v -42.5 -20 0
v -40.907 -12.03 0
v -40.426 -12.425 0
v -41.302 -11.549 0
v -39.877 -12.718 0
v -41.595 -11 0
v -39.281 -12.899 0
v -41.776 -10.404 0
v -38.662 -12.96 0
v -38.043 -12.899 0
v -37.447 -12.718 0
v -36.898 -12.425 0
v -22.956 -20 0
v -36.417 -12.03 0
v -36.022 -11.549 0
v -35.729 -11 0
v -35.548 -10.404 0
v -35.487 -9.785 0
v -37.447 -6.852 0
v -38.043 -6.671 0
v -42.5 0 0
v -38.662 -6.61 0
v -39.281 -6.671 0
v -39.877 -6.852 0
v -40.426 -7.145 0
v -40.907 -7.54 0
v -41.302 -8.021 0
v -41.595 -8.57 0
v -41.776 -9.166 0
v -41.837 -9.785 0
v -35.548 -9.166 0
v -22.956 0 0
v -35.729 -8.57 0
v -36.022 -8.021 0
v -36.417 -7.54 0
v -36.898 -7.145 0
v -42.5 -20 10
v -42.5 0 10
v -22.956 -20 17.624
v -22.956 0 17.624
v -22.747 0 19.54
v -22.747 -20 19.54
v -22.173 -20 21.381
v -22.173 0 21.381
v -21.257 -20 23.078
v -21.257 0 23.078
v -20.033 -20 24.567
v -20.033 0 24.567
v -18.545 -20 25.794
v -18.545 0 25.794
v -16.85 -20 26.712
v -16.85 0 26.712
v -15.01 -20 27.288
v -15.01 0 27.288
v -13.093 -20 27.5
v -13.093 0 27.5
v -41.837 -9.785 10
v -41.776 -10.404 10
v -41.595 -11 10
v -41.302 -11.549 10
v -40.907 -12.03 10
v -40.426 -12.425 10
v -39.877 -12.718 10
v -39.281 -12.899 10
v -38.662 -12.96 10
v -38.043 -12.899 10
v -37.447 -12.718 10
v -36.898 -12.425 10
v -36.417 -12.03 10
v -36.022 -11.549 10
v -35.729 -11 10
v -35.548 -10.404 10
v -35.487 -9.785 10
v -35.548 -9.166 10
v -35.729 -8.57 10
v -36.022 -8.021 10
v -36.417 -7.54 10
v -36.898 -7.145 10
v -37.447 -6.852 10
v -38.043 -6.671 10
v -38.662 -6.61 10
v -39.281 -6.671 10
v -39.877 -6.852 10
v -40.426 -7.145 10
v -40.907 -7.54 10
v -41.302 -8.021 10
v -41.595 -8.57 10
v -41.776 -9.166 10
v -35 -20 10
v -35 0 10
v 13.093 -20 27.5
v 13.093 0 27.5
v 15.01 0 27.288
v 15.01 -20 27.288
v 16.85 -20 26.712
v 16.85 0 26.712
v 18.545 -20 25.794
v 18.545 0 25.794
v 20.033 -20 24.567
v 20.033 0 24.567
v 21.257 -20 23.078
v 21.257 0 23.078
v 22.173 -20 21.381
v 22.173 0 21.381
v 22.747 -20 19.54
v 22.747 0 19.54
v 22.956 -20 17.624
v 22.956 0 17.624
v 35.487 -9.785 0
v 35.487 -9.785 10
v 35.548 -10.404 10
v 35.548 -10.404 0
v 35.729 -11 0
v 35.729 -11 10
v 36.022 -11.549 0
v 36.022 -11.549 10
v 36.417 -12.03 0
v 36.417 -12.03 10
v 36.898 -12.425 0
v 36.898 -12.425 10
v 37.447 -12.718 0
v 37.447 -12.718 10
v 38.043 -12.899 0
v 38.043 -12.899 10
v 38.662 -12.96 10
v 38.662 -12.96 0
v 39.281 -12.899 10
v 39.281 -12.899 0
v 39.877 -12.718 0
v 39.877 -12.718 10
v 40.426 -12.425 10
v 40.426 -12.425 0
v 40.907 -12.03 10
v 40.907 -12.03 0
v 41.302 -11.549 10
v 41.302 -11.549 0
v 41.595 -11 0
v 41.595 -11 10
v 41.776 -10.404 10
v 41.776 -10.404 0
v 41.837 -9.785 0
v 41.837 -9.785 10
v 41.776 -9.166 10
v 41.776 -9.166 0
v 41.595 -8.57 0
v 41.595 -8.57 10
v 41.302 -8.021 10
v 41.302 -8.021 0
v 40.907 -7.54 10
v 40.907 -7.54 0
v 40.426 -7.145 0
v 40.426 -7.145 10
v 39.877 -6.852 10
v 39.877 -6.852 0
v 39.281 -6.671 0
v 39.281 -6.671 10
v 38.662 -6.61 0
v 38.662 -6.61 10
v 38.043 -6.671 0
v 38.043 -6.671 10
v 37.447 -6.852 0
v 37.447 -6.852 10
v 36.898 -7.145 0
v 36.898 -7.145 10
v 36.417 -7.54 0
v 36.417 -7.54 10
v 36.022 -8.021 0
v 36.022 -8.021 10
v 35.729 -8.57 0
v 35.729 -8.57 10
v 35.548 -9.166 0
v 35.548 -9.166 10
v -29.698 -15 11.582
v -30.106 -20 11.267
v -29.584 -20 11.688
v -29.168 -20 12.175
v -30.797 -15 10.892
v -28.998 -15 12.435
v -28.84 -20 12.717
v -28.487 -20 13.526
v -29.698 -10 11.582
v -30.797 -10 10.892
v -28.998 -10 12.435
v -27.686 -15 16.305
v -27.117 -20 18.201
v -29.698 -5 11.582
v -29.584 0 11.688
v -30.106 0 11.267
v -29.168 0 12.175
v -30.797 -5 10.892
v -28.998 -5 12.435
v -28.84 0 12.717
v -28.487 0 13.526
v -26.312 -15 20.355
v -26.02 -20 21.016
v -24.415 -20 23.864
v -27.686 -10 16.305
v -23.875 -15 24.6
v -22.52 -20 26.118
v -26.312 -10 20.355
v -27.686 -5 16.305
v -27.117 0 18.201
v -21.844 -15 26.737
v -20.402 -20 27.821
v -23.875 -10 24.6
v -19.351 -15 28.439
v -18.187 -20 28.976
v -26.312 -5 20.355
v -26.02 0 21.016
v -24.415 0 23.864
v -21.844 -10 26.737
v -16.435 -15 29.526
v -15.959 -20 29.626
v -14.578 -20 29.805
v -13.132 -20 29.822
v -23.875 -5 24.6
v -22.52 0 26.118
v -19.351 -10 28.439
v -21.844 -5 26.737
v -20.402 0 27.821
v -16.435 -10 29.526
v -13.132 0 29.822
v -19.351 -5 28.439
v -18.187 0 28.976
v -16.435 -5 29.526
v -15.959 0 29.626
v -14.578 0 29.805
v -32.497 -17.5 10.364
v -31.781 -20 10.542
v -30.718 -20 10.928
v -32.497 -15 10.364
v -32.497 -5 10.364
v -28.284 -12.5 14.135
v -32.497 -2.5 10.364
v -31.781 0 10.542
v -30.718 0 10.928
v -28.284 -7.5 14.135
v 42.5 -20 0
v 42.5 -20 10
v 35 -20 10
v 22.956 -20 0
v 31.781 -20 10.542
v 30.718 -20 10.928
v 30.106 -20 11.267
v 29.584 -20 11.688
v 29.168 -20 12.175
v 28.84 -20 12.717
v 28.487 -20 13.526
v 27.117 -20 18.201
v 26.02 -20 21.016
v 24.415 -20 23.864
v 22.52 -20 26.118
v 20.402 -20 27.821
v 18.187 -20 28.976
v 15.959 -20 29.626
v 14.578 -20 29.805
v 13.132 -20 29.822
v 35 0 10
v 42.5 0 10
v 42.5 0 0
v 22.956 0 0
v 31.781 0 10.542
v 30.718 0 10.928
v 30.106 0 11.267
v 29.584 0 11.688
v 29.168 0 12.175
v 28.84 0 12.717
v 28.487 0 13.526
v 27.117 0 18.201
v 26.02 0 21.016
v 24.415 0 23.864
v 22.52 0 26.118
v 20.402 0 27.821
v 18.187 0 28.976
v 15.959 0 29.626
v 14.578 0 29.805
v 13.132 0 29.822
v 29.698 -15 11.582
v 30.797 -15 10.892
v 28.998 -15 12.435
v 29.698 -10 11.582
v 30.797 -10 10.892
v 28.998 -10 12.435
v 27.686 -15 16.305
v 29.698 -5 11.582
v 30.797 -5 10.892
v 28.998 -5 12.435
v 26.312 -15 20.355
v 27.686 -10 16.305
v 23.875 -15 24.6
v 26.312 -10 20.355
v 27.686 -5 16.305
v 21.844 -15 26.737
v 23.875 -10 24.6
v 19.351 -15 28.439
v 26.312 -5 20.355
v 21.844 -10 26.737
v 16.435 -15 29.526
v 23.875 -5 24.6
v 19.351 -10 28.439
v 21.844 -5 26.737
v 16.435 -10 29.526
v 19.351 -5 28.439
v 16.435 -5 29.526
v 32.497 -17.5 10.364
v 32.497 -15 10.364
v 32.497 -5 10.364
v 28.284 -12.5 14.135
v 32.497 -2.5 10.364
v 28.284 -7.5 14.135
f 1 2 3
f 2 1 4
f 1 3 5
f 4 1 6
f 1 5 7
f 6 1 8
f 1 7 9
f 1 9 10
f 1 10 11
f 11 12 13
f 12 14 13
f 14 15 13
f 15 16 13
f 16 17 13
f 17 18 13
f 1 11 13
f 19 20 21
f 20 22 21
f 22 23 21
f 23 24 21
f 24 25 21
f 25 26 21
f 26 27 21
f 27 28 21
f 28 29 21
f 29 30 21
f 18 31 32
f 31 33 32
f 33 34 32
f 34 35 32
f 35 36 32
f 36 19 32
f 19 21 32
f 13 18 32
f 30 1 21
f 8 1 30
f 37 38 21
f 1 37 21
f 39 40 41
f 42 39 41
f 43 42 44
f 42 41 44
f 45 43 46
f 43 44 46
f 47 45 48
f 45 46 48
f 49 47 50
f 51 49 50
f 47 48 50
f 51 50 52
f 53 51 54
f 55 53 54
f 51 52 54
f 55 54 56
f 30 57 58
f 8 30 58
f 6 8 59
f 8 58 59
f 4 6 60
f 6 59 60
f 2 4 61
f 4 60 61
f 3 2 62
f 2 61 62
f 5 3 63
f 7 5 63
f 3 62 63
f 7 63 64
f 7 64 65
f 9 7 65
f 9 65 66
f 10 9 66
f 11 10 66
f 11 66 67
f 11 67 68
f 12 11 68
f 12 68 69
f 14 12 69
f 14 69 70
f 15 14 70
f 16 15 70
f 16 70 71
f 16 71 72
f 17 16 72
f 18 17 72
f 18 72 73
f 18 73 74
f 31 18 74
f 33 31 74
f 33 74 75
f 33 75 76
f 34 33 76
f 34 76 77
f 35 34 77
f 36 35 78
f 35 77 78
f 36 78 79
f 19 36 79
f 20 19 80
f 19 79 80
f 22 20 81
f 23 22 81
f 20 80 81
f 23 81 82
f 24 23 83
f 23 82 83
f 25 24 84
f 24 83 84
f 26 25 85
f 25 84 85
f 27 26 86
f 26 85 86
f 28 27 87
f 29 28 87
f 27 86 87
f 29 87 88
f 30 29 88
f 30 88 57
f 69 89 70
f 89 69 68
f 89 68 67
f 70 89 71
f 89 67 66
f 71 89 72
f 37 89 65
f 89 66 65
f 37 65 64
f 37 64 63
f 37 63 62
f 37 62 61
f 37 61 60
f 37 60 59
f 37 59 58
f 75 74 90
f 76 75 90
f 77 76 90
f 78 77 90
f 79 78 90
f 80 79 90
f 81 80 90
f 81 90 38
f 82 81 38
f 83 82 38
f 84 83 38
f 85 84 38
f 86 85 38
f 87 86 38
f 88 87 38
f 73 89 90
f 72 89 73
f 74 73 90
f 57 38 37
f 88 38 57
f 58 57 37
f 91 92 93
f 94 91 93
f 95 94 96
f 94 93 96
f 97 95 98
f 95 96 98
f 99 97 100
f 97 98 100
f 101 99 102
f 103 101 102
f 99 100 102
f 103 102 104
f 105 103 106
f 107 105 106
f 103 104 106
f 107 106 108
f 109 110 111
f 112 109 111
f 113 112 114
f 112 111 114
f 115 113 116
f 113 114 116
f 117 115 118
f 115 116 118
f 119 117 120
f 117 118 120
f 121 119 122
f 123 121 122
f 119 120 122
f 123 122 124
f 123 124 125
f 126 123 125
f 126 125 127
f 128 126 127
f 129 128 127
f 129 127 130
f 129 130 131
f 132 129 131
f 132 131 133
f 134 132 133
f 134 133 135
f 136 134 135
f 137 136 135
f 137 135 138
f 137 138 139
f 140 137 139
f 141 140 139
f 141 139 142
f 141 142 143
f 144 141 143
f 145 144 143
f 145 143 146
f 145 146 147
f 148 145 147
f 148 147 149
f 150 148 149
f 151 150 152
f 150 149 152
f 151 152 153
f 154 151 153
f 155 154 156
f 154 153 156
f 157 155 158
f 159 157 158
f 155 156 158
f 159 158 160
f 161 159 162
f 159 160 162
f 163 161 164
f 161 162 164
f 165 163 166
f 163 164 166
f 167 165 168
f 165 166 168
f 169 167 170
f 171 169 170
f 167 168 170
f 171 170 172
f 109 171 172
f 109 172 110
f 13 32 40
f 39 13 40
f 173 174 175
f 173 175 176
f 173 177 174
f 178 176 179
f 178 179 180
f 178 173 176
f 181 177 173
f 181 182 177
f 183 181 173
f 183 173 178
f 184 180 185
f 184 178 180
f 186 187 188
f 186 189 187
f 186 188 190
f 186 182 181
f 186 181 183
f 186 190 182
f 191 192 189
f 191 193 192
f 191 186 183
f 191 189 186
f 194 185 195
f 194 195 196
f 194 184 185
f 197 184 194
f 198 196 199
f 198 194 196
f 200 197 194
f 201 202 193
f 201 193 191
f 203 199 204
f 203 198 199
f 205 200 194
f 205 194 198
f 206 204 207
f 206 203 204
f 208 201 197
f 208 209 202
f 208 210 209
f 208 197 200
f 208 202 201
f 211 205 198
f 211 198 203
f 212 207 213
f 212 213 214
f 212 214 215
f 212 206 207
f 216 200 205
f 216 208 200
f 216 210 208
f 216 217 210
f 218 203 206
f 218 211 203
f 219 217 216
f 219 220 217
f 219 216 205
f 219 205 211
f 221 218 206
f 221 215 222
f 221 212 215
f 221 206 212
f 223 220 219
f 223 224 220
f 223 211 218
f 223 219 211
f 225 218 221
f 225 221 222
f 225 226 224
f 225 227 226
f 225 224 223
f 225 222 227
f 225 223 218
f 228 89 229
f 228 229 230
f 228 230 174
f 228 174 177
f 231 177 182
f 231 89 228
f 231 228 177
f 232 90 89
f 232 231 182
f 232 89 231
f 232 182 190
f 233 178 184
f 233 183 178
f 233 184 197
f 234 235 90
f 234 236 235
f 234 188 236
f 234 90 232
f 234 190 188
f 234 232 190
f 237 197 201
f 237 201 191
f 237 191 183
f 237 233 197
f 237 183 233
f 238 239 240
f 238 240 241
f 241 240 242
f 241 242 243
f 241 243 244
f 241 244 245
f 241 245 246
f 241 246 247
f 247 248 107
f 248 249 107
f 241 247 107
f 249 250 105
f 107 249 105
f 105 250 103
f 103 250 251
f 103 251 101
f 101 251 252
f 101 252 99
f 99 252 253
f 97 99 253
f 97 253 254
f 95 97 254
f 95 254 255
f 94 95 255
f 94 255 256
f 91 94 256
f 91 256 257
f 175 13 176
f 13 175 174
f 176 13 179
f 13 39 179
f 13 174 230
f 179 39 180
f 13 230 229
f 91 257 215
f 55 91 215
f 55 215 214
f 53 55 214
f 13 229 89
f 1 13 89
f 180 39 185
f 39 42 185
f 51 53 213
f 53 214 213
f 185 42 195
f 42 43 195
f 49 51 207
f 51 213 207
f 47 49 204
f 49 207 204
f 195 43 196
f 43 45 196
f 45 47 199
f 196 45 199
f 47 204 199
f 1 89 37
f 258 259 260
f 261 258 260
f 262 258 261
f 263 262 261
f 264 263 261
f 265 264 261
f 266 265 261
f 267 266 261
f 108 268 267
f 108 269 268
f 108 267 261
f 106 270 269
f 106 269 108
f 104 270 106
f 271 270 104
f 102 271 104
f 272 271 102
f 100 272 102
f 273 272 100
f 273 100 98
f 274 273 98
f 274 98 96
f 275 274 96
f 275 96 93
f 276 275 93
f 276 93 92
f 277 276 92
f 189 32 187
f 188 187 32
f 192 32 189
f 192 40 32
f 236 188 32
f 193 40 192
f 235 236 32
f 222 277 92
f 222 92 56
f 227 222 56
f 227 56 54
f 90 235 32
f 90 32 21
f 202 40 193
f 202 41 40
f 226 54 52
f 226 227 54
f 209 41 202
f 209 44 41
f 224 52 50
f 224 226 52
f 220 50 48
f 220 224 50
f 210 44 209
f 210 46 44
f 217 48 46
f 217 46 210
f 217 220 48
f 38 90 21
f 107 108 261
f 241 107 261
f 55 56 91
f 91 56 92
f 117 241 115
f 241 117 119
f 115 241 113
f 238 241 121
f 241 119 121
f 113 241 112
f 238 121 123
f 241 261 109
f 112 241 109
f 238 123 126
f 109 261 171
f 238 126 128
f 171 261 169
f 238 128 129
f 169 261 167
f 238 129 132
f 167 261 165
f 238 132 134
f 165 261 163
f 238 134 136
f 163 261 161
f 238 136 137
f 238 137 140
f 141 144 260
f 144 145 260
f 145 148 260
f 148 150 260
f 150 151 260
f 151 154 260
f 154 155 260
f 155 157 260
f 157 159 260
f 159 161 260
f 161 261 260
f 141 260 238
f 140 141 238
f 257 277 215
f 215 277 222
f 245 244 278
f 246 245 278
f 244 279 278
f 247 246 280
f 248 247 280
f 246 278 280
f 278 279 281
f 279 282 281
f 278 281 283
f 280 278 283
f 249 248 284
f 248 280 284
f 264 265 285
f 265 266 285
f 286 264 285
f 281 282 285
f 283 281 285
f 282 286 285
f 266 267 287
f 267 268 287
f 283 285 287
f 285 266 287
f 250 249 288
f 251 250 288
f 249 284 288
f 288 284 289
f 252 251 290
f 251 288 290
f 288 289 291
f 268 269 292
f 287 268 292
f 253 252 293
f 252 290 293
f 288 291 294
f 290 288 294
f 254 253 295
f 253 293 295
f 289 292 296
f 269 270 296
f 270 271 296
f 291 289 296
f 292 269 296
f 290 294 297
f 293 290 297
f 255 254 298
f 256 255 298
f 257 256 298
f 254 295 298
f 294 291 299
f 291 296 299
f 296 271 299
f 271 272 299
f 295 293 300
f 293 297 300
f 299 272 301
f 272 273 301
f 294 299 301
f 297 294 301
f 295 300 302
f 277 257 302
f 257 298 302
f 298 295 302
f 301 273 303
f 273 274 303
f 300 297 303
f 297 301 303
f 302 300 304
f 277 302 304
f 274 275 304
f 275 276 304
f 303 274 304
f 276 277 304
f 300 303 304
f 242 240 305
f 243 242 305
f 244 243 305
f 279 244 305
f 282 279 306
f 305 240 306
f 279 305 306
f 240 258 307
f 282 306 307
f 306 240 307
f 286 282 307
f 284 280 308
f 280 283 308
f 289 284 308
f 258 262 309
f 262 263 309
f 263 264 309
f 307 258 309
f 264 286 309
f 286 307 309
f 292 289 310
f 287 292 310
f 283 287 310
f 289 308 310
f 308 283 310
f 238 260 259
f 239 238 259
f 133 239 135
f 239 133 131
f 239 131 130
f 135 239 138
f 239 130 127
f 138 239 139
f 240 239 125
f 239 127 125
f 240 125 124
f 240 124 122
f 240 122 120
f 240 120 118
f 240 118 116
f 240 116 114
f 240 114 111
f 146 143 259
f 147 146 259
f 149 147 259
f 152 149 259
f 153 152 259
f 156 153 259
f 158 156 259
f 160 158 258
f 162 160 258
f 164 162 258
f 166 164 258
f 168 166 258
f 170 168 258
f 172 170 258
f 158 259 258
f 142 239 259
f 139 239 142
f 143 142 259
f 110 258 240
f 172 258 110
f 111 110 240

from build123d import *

# Parameters (mm, degrees)
F3_DEPTH = 20
F5_D     = 6.35
F6_D     = 6.35


with BuildPart() as f3:
    # F2 (on Front) → F3 (new body)
    with BuildSketch(Plane.XZ):
        with BuildLine():
            Line((0, 29.8221680522), (-13.1319385877, 29.8221680522))
            add(Edge.make_bspline(
                [(-35, 10), (-31.0387470191, 10.3774955025), (-28.7332573155, 11.8333441201), (-27.7320793476, 16.5781182185), (-24.7421079623, 25.5876719553), (-17.7754473796, 30.0339317742), (-13.1319385877, 29.8221680522)],
                knots=[0, 0, 0, 0, 0.2304435878, 0.4134879343, 0.6870551645, 1, 1, 1, 1], degree=3))
            Line((-35, 10), (-42.5, 10))
            Line((-42.5, 10), (-42.5, 0))
            Line((-42.5, 0), (-22.9563365987, 0))
            Line((-22.9563365987, 0), (-22.9563365987, 10))
            Line((-22.9563365987, 10), (-22.9563365987, 17.6236335862))
            ThreePointArc((-22.9563365987, 17.6236335862), (-20.0327244278, 24.5669984184), (-13.093320632, 27.5))
            Line((-13.093320632, 27.5), (0, 27.5))
            Line((0, 27.5), (13.093320632, 27.5))
            ThreePointArc((13.093320632, 27.5), (20.0327244278, 24.5669984184), (22.9563365987, 17.6236335862))
            Line((22.9563365987, 17.6236335862), (22.9563365987, 10))
            Line((22.9563365987, 10), (22.9563365987, 0))
            Line((22.9563365987, 0), (42.5, 0))
            Line((42.5, 0), (42.5, 10))
            Line((42.5, 10), (35, 10))
            add(Edge.make_bspline(
                [(35, 10), (31.0387470191, 10.3774955025), (28.7332573155, 11.8333441201), (27.7320793476, 16.5781182185), (24.7421079623, 25.5876719553), (17.7754473796, 30.0339317742), (13.1319385877, 29.8221680522)],
                knots=[0, 0, 0, 0, 0.2304435878, 0.4134879343, 0.6870551645, 1, 1, 1, 1], degree=3))
            Line((13.1319385877, 29.8221680522), (0, 29.8221680522))
        make_face()
    extrude(amount=F3_DEPTH)

    # F5 (through all)
    with Locations(Plane(origin=(0, 0, 0), x_dir=(1, 0, 0), z_dir=(0, 0, -1))):
        with Locations((-38.6619865894, 9.7850039601)):
            Hole(F5_D / 2)

    # F6 (through all)
    with Locations(Plane(origin=(0, 0, 0), x_dir=(1, 0, 0), z_dir=(0, 0, -1))):
        with Locations((38.6619865894, 9.7850039601)):
            Hole(F6_D / 2)


solid = f3.part
